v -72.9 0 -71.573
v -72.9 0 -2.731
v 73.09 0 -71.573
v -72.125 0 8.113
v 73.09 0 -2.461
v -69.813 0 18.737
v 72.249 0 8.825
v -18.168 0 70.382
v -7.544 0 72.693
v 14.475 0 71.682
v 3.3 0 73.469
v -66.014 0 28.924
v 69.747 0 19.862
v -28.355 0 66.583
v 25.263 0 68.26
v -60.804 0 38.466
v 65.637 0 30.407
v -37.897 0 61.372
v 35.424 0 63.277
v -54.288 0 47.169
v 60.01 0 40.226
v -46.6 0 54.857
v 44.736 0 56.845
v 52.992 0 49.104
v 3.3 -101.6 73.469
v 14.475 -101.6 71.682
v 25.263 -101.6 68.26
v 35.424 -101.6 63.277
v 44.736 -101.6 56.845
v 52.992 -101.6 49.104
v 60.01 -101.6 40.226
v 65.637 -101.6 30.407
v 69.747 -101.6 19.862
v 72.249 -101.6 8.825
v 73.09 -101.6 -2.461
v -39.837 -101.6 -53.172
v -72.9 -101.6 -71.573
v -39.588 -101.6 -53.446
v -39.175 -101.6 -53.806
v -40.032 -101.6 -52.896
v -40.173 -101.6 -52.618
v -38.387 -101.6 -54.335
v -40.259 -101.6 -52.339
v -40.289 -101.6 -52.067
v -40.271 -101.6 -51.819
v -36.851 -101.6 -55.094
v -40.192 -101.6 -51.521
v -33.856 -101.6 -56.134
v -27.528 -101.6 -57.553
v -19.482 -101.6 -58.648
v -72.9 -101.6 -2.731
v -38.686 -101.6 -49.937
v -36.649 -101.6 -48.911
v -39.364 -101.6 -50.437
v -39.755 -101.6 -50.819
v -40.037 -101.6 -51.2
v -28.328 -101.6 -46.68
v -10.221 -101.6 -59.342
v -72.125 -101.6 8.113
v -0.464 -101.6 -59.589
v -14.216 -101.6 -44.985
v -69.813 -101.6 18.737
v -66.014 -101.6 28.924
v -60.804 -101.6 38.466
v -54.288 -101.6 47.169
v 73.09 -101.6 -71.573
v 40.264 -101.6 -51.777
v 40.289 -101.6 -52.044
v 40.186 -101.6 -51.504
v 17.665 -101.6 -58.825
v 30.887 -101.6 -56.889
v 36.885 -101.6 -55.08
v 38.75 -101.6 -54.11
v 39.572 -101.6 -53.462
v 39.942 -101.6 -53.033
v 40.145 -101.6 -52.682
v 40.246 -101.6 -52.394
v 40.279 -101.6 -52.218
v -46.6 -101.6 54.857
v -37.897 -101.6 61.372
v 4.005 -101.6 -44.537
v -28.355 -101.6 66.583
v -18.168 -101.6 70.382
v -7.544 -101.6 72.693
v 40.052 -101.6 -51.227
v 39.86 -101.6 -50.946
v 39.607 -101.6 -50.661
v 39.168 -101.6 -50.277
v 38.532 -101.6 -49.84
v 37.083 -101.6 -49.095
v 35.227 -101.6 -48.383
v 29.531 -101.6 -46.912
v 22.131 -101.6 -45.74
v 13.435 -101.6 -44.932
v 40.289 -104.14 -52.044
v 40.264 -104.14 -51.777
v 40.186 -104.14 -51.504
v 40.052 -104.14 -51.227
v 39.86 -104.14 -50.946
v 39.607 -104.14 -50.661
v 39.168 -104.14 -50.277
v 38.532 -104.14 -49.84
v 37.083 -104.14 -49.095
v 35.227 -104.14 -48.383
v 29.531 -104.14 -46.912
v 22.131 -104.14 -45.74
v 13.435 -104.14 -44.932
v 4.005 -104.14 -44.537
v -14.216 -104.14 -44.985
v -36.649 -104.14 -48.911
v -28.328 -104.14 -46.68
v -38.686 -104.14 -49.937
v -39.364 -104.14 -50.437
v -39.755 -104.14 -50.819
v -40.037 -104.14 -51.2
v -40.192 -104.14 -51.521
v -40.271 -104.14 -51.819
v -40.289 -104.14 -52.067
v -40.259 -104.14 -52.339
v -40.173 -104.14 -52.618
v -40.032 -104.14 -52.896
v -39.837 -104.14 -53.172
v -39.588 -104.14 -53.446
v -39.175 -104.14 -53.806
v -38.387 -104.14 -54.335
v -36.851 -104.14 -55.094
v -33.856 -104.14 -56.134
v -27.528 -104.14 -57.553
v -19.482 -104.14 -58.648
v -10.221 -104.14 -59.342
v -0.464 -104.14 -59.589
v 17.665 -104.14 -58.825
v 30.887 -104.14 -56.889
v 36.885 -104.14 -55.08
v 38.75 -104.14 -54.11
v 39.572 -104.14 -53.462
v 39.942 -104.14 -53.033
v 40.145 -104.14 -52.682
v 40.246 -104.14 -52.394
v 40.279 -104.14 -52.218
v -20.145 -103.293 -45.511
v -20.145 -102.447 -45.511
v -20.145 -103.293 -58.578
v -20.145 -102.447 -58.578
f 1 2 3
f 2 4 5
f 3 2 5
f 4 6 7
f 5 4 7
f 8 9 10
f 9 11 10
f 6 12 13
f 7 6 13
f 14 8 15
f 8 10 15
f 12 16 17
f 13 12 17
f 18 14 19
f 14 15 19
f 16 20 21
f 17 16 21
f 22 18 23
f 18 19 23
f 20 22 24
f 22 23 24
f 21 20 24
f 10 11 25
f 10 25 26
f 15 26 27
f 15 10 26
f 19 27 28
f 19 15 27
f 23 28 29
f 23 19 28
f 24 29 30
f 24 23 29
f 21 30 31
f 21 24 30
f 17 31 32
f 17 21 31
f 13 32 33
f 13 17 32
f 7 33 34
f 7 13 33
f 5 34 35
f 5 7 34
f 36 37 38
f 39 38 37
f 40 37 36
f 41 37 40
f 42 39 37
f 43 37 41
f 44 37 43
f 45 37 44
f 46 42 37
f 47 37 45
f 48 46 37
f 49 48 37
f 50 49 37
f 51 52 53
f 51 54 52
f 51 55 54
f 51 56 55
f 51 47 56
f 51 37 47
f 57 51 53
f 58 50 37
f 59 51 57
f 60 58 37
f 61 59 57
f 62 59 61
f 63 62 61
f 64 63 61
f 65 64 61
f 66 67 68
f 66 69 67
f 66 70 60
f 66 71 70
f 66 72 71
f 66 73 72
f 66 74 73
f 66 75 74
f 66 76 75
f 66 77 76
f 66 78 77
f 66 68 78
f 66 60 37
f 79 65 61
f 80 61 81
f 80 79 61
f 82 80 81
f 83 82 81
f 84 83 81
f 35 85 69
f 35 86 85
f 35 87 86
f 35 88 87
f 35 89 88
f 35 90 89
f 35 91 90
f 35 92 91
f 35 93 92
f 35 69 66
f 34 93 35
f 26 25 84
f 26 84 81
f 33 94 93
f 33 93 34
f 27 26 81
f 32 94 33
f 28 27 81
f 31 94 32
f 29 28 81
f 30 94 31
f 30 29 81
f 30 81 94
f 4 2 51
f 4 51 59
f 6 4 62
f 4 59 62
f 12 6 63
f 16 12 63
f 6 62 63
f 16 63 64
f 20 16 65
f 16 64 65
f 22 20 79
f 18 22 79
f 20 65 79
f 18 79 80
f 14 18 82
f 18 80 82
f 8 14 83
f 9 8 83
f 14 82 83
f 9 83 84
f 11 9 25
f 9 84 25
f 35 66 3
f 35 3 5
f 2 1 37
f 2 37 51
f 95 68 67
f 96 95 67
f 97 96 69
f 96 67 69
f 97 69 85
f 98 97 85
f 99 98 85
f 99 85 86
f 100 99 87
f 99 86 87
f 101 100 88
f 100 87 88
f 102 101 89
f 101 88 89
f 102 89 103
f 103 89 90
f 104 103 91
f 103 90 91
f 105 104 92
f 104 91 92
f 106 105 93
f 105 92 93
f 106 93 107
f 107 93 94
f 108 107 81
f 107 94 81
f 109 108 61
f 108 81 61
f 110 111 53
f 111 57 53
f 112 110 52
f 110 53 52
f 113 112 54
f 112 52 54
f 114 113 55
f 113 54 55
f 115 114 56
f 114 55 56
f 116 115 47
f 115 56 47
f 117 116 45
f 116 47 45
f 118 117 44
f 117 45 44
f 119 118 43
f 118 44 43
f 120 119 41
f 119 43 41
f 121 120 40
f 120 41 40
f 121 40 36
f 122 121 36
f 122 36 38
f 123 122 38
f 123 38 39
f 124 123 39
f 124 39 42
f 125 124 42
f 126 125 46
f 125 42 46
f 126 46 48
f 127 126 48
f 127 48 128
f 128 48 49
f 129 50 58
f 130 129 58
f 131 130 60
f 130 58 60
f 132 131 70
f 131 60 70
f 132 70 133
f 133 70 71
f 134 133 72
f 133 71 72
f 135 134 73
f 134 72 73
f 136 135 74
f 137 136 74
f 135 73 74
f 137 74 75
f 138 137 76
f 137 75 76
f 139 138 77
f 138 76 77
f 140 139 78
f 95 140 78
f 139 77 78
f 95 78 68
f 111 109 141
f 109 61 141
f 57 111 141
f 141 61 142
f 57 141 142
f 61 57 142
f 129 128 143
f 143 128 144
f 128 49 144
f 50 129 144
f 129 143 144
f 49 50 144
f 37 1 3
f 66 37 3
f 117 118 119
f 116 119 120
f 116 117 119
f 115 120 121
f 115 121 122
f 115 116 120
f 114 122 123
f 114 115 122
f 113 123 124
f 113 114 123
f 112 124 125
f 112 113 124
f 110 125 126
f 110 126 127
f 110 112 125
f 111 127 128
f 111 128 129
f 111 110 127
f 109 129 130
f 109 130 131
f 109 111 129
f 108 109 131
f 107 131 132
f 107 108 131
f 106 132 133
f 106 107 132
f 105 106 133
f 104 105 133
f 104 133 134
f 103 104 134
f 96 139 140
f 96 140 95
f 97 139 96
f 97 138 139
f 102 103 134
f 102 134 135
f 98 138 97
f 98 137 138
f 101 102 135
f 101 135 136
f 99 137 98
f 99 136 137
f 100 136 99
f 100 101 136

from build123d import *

# Parameters (mm, degrees)
F0_W        = 145.98980546
F0_H        = 145.0418308377
F1_DEPTH    = 101.6
F2_R        = 76.2
F3_T1_DEPTH = 481.2494898574
F5_DEPTH    = 2.54


# Not quite as in the source:
# - a fillet or chamfer that OpenCascade refuses, or shapes differently, is made with other operations: its cross-section is extruded or revolved along the edge and cut away or added


with BuildPart() as f1:
    # F0 (on Front) → F1 (new body)
    with BuildSketch(Plane.XZ):
        with Locations((0.0947937369, 0.9479857981)):
            Rectangle(F0_W, F0_H)
    extrude(amount=F1_DEPTH)

    # F2
    f2_edges = [f1.edges().sort_by_distance(p)[0] for p in [
        (-72.900109, -50.8, 73.468901),
    ]]
    fillet(f2_edges, radius=F2_R)

    # F3: fillet of radius 76.2 on 1 edges, made by hand

    # F3_s2 → F3_t1 (cut)
    with BuildSketch(Plane.XZ.offset(-189.8247449287)):
        with BuildLine():
            ThreePointArc((3.2998910069, 73.468901217), (52.9918213106, 49.1044140169), (73.0896964669, -2.4609967545))
            Line((73.0896964669, -2.4609967545), (73.0896964669, 73.468901217))
            Line((73.0896964669, 73.468901217), (3.2998910069, 73.468901217))
        make_face()
    extrude(amount=F3_T1_DEPTH, mode=Mode.SUBTRACT)

    # F4 (on face) → F5 (join)
    with BuildSketch(Plane.XZ.offset(101.6)):
        with BuildLine():
            add(Edge.make_bspline(
                [(40.2893982828, -52.0444214344), (40.2893982828, -38.976719833), (-20.1446991414, -45.5105706337), (-80.5787965655, -52.0444214344), (-20.1446991414, -58.5782722351), (40.2893982828, -65.1121230358), (40.2893982828, -52.0444214344)],
                knots=[0, 0, 0, 2.0943951024, 2.0943951024, 4.1887902048, 4.1887902048, 6.2831853072, 6.2831853072, 6.2831853072], degree=2, weights=[1, 0.5, 1, 0.5, 1, 0.5, 1]))
        make_face()
    extrude(amount=F5_DEPTH)


solid = f1.part
